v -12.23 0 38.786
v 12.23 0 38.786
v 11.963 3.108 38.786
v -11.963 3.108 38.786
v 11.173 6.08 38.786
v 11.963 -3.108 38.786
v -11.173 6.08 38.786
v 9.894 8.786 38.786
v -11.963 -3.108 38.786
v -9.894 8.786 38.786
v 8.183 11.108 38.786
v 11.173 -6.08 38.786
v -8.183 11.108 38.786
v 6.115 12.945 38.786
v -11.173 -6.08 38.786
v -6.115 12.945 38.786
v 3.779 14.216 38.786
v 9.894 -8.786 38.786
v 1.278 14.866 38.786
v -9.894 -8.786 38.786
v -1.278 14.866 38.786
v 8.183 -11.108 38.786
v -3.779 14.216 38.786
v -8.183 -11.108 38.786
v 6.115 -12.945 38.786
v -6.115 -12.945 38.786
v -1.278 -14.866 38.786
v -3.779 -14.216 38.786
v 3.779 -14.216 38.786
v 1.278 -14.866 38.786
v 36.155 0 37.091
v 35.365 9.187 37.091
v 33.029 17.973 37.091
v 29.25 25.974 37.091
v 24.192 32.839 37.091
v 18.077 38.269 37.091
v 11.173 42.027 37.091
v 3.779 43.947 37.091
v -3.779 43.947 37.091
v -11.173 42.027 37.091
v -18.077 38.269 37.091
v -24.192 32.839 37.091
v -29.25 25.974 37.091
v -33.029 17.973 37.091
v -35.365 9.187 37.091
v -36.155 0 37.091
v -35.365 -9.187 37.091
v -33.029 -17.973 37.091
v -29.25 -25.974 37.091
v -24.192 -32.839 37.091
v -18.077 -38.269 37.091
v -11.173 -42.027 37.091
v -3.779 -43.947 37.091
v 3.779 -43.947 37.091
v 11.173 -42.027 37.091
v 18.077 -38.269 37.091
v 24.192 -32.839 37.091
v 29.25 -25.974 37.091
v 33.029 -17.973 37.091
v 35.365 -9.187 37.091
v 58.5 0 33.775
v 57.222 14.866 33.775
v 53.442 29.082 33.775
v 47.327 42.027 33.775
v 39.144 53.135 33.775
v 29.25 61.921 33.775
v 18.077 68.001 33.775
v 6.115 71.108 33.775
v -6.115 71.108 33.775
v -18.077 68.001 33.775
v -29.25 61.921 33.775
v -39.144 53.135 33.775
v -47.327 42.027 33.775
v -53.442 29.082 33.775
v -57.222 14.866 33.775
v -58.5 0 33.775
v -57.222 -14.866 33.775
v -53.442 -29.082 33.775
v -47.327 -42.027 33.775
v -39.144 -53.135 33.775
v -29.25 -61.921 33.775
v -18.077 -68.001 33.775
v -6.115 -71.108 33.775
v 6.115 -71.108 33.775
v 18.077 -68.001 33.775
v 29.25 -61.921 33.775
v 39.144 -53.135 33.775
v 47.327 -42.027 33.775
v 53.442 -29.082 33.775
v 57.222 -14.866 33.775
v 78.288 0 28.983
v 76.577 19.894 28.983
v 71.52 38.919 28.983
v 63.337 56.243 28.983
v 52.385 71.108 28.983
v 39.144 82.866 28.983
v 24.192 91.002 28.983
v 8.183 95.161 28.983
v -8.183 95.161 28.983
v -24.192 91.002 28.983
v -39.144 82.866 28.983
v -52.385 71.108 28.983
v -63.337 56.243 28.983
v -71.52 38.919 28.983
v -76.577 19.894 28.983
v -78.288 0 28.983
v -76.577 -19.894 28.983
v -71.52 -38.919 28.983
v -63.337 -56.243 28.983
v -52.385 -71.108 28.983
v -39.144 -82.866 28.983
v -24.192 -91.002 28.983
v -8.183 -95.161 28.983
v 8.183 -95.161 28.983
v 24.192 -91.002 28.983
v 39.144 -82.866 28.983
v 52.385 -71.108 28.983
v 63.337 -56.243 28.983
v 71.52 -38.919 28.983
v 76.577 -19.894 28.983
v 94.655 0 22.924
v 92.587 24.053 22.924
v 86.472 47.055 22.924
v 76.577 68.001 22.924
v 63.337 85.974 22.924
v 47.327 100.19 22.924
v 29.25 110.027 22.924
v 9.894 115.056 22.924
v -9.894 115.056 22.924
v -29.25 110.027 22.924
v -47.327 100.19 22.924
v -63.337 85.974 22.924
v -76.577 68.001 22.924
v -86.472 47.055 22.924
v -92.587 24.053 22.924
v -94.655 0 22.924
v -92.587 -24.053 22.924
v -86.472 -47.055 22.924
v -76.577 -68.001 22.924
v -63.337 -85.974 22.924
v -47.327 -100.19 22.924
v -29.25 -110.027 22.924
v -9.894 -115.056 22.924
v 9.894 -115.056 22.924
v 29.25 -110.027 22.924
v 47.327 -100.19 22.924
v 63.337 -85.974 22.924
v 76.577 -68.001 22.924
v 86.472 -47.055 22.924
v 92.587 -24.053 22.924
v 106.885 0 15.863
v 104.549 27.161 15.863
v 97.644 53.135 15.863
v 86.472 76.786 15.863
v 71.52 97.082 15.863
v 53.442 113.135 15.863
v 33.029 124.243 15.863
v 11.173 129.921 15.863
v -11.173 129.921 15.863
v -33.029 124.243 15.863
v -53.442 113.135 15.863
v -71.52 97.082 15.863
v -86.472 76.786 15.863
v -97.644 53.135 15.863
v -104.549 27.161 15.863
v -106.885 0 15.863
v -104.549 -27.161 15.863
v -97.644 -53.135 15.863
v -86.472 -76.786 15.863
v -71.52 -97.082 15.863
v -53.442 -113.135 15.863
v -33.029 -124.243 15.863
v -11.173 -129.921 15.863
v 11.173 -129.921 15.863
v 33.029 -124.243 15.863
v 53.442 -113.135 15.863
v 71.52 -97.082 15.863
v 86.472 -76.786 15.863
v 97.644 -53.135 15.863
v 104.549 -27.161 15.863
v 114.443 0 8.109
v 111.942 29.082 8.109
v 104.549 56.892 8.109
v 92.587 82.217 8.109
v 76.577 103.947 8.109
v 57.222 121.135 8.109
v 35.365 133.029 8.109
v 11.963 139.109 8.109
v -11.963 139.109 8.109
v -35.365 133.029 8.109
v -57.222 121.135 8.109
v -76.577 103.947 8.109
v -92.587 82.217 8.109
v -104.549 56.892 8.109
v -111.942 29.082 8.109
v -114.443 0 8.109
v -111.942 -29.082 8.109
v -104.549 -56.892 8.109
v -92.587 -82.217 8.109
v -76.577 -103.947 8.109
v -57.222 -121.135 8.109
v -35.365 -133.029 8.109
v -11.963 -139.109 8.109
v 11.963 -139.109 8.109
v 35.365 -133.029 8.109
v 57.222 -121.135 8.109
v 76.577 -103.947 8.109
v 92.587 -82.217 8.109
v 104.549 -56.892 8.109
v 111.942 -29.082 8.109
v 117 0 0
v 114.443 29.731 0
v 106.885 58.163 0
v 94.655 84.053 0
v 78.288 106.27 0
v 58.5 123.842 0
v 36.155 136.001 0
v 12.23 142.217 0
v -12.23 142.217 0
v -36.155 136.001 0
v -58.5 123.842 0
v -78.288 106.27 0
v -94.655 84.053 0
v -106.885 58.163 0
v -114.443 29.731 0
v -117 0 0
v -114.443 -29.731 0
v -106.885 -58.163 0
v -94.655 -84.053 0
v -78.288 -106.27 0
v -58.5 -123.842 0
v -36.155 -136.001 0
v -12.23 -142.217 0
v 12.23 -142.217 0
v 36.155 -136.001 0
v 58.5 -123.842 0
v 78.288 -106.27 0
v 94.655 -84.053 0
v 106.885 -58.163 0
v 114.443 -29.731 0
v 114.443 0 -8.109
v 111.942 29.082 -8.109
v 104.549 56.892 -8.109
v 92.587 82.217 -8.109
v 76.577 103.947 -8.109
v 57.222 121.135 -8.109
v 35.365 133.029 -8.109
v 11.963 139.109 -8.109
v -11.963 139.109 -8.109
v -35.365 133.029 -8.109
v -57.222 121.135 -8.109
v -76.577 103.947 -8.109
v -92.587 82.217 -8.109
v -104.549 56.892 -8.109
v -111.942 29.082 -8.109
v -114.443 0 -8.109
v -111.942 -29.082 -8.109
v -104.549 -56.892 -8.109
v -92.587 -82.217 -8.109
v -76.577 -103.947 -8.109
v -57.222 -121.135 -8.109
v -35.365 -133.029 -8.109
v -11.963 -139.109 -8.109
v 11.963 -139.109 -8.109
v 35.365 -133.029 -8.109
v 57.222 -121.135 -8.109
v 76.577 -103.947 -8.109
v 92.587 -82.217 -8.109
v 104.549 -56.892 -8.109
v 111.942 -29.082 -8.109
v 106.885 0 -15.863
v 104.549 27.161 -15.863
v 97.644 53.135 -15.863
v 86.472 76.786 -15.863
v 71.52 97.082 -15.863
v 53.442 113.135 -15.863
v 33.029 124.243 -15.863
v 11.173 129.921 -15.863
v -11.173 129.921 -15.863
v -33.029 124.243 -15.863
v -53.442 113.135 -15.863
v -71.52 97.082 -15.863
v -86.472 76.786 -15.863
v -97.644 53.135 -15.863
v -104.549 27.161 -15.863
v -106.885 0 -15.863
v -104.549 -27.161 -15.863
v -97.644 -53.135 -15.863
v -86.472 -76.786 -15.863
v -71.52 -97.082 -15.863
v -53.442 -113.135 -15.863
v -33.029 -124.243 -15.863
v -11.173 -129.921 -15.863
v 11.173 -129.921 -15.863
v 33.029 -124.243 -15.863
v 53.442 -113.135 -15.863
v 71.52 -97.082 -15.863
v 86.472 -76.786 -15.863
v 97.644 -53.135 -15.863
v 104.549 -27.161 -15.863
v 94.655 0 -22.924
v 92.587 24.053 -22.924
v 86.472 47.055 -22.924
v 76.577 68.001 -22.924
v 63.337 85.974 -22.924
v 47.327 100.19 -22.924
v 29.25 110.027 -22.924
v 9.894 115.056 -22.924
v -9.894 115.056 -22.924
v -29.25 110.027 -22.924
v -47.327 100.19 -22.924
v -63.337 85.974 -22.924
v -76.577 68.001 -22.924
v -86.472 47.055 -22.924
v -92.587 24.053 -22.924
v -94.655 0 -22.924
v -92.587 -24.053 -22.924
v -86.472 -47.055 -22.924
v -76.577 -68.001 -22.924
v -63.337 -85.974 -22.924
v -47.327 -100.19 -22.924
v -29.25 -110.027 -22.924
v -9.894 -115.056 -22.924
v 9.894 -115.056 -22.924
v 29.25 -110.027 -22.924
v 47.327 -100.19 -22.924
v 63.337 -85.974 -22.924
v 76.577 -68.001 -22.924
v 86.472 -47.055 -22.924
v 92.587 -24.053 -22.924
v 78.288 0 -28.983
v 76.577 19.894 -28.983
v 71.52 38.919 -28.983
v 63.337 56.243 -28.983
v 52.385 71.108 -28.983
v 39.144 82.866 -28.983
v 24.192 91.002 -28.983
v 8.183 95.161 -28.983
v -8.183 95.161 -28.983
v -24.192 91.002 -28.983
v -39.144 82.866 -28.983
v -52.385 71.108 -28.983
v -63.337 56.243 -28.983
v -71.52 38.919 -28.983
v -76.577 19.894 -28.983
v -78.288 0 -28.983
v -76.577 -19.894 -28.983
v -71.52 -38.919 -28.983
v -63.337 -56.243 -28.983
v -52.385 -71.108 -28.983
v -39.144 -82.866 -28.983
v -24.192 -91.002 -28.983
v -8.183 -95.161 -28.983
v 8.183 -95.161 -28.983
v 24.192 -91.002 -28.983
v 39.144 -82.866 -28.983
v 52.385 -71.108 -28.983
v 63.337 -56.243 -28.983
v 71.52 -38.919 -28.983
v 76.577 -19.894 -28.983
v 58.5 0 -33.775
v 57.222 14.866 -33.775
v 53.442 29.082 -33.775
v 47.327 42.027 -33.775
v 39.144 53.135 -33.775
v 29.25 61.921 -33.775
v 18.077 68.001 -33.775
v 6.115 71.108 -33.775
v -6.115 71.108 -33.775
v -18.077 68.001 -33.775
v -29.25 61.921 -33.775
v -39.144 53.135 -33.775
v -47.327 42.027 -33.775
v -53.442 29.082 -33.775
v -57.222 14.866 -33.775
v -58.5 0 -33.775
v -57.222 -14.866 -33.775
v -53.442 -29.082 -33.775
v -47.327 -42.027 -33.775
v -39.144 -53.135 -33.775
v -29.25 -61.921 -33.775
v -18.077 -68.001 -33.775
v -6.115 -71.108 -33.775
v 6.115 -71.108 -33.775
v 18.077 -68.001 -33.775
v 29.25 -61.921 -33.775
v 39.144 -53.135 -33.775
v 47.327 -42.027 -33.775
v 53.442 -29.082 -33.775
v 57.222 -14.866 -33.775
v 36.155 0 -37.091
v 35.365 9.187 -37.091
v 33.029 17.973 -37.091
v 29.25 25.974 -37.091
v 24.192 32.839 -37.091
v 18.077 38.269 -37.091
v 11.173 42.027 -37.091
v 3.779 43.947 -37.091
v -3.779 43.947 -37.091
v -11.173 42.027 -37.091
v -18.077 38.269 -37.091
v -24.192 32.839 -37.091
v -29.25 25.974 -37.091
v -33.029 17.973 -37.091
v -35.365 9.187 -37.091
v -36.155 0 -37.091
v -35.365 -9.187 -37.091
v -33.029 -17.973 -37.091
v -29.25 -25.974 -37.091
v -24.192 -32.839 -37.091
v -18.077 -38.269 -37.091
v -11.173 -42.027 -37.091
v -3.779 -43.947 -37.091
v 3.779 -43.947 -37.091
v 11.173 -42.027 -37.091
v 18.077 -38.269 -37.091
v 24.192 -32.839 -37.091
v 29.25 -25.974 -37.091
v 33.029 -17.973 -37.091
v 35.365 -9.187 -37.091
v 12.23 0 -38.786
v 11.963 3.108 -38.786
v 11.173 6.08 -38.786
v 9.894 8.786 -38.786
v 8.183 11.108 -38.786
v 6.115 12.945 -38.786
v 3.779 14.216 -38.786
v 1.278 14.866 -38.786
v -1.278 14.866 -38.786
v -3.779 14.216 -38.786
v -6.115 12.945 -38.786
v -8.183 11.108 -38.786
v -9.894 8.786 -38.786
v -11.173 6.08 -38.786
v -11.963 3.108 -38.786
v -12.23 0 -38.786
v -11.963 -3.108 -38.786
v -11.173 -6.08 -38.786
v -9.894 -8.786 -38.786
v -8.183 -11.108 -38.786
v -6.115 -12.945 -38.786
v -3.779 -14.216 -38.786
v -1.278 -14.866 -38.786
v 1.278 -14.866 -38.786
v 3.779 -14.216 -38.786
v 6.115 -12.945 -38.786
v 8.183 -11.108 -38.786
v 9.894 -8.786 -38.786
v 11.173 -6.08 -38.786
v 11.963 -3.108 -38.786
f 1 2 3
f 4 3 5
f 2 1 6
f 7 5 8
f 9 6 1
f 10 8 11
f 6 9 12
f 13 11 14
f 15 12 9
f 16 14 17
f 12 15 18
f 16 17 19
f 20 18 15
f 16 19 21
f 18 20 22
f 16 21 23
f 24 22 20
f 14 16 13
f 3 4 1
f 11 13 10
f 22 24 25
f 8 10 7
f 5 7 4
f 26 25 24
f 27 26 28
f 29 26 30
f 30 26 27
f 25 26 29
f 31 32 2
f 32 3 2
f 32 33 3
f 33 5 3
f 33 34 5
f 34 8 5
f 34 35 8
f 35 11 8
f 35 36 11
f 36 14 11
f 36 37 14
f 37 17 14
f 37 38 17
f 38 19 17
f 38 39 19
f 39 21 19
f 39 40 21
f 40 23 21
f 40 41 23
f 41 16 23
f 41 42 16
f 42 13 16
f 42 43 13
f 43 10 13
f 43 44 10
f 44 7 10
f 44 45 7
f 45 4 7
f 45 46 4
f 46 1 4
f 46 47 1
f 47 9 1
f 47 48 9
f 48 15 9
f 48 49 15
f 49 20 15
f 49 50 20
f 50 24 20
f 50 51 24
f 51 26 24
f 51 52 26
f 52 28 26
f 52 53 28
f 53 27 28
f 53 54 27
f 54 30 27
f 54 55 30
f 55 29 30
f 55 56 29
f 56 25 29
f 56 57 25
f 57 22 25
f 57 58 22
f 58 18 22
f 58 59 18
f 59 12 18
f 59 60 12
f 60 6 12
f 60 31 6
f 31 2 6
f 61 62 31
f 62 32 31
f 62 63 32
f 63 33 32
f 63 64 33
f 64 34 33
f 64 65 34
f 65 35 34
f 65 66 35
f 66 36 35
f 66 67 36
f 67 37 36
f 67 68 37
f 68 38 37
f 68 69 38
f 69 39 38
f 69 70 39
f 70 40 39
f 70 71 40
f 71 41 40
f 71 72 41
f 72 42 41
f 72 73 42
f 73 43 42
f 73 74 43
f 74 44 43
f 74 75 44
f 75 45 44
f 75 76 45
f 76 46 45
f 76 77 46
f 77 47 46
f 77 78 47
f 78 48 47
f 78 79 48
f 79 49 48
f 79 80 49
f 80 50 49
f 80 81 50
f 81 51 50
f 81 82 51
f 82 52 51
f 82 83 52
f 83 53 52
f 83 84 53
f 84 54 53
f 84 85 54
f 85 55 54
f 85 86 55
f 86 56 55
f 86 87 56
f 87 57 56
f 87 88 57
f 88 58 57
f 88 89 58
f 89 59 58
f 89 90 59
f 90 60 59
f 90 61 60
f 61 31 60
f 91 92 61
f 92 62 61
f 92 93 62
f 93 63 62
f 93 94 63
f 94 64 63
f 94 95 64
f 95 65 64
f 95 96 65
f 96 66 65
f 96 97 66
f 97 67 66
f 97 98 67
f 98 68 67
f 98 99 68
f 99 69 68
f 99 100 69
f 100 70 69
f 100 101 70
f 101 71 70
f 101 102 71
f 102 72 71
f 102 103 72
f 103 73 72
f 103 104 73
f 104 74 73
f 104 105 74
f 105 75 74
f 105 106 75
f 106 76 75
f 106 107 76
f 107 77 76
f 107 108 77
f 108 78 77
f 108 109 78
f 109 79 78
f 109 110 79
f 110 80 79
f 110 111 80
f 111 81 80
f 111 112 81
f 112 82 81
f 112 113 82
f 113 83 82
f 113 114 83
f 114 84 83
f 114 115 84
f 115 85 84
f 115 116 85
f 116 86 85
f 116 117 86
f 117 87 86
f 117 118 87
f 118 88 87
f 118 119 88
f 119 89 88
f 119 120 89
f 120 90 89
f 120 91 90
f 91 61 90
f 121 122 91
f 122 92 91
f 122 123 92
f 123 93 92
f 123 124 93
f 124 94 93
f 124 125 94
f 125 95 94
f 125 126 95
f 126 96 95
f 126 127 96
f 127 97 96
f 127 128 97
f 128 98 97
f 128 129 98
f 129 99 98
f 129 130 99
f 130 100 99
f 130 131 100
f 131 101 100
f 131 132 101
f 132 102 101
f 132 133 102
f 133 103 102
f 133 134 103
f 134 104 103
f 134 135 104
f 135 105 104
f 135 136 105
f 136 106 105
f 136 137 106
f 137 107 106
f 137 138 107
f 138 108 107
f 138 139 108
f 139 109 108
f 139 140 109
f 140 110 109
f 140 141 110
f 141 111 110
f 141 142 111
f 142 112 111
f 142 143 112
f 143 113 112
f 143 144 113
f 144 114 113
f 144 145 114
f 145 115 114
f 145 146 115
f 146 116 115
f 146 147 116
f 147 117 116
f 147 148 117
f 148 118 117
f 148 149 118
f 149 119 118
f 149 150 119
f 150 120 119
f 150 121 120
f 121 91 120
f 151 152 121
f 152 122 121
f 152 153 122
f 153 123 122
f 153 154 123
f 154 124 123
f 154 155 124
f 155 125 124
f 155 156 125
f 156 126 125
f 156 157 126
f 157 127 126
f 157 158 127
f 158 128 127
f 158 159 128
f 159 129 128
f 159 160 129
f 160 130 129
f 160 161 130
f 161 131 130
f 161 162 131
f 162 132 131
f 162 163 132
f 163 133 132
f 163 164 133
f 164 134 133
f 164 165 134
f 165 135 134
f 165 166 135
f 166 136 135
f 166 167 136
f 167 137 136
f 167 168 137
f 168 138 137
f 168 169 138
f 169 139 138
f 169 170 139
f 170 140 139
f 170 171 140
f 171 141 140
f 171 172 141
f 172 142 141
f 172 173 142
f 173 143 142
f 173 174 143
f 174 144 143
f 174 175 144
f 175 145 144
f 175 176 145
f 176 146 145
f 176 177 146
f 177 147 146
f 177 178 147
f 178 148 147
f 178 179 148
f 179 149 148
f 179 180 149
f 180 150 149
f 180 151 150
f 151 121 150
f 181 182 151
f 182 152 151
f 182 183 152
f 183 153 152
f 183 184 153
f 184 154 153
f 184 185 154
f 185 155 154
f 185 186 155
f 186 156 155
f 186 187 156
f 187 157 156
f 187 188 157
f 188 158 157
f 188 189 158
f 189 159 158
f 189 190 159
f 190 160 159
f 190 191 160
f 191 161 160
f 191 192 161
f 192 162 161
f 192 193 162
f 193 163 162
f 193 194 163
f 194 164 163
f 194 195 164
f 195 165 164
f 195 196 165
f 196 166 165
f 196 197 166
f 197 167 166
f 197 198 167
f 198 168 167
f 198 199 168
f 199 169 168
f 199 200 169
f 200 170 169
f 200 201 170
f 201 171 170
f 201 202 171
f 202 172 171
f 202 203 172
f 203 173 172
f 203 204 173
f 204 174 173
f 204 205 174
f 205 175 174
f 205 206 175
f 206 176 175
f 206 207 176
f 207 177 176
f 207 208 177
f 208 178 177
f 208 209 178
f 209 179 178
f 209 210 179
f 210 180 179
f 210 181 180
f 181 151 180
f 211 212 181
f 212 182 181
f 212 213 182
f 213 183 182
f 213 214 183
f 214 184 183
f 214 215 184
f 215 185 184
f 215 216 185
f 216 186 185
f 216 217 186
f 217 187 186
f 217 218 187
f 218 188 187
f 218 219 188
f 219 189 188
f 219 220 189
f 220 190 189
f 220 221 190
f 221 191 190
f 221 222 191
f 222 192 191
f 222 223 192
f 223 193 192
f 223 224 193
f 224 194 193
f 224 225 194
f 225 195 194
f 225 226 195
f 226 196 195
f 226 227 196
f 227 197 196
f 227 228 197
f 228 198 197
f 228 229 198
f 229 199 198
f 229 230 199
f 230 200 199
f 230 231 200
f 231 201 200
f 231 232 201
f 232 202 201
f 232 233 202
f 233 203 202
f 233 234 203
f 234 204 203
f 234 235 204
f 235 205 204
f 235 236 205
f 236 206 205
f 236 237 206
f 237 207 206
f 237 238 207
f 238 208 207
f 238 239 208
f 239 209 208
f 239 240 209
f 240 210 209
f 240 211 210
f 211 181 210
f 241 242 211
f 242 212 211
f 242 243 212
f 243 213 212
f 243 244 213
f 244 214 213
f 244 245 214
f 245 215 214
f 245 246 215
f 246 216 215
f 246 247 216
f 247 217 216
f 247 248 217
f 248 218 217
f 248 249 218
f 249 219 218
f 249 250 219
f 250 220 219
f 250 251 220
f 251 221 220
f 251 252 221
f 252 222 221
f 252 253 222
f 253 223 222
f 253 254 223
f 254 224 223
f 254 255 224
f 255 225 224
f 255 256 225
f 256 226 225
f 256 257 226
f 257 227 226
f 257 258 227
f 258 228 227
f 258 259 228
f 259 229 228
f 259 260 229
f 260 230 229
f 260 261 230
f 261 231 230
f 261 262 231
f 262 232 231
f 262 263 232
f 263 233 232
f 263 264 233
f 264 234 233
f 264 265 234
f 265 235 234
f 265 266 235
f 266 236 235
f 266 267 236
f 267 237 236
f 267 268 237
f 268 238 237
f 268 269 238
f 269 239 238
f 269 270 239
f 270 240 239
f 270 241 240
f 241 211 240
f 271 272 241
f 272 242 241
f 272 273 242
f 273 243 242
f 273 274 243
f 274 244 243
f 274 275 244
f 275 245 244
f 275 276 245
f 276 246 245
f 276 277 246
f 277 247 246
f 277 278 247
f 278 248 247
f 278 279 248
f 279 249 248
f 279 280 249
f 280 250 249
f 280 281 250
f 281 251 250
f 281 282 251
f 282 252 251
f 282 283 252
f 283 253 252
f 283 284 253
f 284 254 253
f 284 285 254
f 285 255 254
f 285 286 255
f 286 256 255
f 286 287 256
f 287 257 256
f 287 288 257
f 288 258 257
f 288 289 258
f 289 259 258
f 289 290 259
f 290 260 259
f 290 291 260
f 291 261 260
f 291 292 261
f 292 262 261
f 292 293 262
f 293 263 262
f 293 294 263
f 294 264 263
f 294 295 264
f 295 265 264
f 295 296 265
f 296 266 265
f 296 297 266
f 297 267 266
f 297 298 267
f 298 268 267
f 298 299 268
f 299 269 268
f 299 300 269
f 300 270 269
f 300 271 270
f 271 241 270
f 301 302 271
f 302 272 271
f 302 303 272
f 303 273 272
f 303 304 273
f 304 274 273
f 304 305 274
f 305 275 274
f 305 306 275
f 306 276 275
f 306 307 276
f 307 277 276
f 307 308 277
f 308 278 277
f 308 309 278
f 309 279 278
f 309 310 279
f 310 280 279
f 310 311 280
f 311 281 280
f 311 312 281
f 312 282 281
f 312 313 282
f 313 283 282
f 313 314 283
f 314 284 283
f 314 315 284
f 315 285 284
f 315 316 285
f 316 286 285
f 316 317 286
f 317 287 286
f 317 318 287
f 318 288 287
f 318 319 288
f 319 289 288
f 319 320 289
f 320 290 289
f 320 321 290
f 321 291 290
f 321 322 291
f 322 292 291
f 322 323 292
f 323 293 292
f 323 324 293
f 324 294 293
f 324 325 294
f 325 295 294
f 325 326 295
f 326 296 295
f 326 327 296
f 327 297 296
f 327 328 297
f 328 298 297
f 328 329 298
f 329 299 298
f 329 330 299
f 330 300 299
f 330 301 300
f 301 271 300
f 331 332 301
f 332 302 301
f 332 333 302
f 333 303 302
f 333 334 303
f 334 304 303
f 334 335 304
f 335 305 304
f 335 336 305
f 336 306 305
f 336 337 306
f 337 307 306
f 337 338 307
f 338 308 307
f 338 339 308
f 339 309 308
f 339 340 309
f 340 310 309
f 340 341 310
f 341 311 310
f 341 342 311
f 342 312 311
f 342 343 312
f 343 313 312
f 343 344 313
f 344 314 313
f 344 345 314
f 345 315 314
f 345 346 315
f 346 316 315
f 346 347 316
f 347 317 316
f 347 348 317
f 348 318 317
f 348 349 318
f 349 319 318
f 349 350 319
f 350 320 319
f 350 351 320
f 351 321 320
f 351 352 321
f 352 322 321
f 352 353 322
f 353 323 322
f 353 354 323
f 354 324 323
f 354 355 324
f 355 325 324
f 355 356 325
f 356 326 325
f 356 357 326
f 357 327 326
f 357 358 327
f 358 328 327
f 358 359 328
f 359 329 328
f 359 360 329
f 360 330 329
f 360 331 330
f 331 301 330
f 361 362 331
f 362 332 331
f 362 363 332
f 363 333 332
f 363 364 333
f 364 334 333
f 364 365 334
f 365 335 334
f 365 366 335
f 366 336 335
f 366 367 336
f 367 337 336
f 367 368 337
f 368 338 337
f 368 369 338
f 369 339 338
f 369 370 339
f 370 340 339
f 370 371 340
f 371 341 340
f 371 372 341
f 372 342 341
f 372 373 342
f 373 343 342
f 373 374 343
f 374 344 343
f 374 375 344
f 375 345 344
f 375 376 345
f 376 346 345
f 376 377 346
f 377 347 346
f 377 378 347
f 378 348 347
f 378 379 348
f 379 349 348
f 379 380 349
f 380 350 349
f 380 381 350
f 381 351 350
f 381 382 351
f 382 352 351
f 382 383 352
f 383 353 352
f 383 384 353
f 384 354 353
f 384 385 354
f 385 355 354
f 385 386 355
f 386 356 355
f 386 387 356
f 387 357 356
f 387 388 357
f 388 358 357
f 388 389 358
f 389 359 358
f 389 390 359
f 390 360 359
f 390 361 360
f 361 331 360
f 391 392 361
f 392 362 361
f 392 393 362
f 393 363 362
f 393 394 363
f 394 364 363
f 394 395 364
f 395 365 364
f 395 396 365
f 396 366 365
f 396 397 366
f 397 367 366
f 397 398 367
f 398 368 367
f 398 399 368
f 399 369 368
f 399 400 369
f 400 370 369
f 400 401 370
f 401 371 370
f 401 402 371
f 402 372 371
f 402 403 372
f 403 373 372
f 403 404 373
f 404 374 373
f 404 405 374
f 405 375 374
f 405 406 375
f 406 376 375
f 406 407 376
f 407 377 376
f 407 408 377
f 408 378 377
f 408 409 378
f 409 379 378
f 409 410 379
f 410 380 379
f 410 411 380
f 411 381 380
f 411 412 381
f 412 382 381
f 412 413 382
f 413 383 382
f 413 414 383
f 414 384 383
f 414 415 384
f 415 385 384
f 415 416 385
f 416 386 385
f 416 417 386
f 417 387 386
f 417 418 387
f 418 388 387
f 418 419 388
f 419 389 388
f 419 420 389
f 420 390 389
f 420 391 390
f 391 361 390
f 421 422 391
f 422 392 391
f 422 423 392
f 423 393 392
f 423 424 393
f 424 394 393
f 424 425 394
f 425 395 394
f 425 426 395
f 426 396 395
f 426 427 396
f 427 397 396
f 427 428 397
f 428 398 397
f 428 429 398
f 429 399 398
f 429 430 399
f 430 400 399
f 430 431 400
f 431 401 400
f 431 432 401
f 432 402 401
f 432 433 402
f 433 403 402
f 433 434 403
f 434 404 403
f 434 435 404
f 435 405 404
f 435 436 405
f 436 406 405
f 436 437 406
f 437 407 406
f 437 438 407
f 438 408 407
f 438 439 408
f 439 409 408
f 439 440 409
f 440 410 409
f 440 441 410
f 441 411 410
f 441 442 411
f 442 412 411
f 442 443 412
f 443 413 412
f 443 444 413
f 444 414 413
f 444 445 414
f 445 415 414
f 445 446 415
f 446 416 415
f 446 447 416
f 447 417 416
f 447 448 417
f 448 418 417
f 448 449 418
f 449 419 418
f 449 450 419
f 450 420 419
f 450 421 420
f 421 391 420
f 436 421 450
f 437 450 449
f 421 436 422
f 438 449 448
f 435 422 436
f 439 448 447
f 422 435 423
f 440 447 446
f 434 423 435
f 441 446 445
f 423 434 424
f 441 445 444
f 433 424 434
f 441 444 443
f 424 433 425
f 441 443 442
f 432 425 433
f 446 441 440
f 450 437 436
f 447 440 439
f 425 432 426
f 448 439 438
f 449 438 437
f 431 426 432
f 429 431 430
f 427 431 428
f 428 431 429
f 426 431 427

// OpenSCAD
// Generated by SolidPython 1.0.1 on 2020-07-29 00:46:48


scale(v = [9, 11, 3]) {
	sphere(r = 13);
}
/***********************************************
*********      SolidPython code:      **********
************************************************
 
# import packages: SolidPython
from solid import *
from solid.utils import *
from itertools import chain, combinations, permutations


class Resize:

    def __init__(self, scad_file):
        self.scad_file = scad_file
        #self.scad_file = import_scad(scad_file)
        # cone/cylinder param:
        self.r1 = 0
        self.r2 = 0
        self.h = 0
        # rectangular prism param:
        self.w = 0
        self.l = 0
        # ellipse param:
        self.r = 0

    # import OpenScad code (file name corresponds to shape)


    # classify shape + parameters
    def assign(self, param1, param2, param3):
        if self.scad_file == 'cone.scad':
            self.r1 = param1
            self.r2 = param2
            self.h = param3
        elif self.scad_file == 'cylinder.scad':
            self.r1 = param1
            self.r2 = param2
            self.h = param3
        elif self.scad_file == 'rectangularPrism.scad':
            self.h = param1
            self.l = param2
            self.w = param3
        else:
            self.r = param1
            self.h = param2

    # resize parameters
    def iterate(self):
        x = range(3, 20, 2)
        i = 1
        if self.scad_file == 'cone.scad':
            tempList = list(permutations(x, 2))
            for temp in tempList:
                param1 = temp[0]
                param2 = temp[1]
                filepath = 'produced_scad_files/' + 'cone' + str(param1) + '_' + str(param2) + '_' + '.scad'
                scad_render_to_file(cylinder(h=param1, r1=param2, r2=0), filepath)

        elif self.scad_file == 'cylinder.scad':
            tempList = list(permutations(x, 3))
            for temp in tempList:
                param1 = temp[0]
                param2 = temp[1]
                filepath = 'produced_scad_files/' + 'cylinder' + str(param1) + '_' + str(param2) + '_' + '.scad'
                scad_render_to_file(cylinder(h=param1, r1=param2, r2=param2), filepath)

        elif self.scad_file == 'rectangularPrism.scad':
            tempList = list(permutations(x, 3))
            for temp in tempList:
                param1 = temp[0]
                param2 = temp[1]
                param3 = temp[2]
                filepath = 'produced_scad_files/' + 'rectangularPrism' + str(param1) + '_' + str(param2) + '_' + str(
                    param3) + '.scad'
                scad_render_to_file(cube(size=(param1, param2, param3)), filepath)

        elif self.scad_file == 'ellipse.scad':
            tempList = list(permutations(x, 4))
            for temp in tempList:
                param1 = temp[0]
                param2 = temp[1]
                param3 = temp[2]
                param4 = temp[3]
                filepath = 'produced_scad_files/' + 'ellipse' + str(param1) + '_' + str(param2) + '_' + str(param3) + '_' + str(param4) + '.scad'
                scad_render_to_file(scale([param1, param2, param3])(sphere(r=param4)), filepath)

    def render_to_scadfile(self):
        scad_render_to_file(scad, 'example.scad') 
 
************************************************/
